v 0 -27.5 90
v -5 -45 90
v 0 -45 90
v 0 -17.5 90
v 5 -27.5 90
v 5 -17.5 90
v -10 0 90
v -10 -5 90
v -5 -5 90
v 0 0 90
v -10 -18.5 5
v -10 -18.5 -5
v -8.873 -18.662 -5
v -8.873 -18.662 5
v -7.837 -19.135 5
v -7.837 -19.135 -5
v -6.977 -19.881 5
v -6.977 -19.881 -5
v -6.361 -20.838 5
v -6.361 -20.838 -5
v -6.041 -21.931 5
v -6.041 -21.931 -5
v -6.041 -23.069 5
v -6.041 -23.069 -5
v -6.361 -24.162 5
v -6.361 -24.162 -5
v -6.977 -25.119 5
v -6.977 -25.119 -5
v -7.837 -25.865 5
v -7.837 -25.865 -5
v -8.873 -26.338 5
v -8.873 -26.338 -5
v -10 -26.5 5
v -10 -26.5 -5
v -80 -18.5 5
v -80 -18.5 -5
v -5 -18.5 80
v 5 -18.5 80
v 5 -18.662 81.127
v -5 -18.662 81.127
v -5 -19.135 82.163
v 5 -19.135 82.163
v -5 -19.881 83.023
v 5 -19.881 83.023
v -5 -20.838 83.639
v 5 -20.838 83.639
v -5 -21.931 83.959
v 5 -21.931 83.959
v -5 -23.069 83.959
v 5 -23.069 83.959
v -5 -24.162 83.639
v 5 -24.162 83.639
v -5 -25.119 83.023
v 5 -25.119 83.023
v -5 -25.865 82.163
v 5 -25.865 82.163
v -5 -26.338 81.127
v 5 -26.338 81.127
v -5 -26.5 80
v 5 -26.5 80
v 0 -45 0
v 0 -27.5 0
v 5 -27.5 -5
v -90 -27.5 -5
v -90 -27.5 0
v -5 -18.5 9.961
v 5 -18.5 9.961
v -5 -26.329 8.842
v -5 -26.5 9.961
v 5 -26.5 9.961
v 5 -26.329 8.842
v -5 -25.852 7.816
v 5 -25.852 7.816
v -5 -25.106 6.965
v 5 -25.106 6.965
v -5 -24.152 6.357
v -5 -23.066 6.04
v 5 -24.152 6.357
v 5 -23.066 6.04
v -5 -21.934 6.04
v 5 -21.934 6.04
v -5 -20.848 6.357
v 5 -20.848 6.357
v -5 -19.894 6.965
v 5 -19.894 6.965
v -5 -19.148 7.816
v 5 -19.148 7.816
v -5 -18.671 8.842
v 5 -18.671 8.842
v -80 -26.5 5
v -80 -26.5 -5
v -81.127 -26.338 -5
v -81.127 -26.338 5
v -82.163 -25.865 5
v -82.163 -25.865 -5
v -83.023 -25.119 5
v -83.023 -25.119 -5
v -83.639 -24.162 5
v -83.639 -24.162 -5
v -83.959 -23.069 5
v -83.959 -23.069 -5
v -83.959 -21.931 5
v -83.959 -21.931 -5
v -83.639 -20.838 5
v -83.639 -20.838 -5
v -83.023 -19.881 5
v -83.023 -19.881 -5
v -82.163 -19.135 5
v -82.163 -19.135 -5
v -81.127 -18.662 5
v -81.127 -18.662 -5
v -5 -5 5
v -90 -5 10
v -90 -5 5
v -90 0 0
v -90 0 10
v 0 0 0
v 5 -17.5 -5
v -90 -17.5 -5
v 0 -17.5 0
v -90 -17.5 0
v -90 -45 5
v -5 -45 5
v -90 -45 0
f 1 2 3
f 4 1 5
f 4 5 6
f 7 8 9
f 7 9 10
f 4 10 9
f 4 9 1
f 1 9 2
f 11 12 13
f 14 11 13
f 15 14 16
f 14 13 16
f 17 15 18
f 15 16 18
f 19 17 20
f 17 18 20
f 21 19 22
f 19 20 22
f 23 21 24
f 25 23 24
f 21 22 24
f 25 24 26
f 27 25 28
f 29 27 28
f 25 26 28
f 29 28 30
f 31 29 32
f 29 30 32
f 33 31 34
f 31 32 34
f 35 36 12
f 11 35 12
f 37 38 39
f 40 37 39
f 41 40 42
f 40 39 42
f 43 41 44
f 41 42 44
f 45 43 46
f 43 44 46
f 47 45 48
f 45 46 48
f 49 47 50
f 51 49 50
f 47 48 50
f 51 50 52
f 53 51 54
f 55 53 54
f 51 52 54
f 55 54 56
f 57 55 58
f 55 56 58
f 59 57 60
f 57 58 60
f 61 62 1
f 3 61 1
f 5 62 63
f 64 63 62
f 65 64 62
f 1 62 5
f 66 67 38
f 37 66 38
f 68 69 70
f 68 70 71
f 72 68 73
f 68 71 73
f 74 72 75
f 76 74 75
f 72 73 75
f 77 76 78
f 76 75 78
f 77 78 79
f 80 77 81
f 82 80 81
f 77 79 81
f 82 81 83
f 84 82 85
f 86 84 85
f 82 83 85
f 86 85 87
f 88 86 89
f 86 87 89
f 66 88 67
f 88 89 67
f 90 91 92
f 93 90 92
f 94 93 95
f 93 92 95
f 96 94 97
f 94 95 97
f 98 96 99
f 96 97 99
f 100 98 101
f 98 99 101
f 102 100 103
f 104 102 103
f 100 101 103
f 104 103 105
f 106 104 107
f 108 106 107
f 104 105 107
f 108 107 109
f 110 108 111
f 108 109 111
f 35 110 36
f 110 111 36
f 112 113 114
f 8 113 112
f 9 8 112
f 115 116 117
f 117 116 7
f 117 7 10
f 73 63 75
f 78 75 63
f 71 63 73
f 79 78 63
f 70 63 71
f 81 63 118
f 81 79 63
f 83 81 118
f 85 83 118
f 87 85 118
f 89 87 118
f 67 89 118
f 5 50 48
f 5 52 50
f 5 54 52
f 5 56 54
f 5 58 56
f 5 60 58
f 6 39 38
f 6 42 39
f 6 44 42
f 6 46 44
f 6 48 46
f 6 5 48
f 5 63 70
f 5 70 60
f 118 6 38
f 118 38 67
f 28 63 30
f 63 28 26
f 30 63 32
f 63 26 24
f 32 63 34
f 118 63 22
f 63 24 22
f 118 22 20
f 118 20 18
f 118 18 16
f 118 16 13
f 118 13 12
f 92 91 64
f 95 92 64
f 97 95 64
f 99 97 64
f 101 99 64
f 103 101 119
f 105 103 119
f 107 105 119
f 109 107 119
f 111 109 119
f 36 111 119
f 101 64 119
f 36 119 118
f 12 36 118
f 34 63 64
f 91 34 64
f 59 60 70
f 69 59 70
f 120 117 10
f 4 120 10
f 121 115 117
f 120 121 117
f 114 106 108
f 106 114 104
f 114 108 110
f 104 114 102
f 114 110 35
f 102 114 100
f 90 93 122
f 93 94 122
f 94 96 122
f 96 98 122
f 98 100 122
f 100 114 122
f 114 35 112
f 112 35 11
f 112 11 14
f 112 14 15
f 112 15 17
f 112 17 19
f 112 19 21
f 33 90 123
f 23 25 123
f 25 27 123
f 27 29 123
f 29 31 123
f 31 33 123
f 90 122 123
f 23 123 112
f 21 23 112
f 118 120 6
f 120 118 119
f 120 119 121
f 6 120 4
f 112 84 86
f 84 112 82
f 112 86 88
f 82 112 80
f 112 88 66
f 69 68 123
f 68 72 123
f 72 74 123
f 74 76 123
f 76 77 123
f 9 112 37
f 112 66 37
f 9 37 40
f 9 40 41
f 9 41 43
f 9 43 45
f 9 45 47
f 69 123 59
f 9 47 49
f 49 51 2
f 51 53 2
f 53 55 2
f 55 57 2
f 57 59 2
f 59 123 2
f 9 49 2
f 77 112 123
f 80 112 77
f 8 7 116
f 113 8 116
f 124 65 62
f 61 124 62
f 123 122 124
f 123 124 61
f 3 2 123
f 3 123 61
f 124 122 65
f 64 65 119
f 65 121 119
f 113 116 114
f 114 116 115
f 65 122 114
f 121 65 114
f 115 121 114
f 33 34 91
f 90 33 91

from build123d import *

# Parameters (mm, degrees)
F1_DEPTH  = 45
F3_DEPTH  = 40
F4_W      = 90
F4_H      = 10
F5_DEPTH  = 5
F6_W      = 10
F6_H      = 95
F7_DEPTH  = 5
F9_DEPTH  = 10
F11_DEPTH = 10


with BuildPart() as f1:
    # F0 (on Front) → F1 (new body)
    with BuildSketch(Plane.XZ):
        Polygon((-90, 10), (-90, 0), (0, 0), (0, 90), (-10, 90), align=None)
    extrude(amount=F1_DEPTH)

    # F2 (on face) → F3 (cut)
    with BuildSketch(Plane.XZ.offset(45)):
        Polygon((-10, 90), (-90, 10), (-90, 5), (-5, 5), (-5, 90), align=None)
    extrude(amount=-F3_DEPTH, mode=Mode.SUBTRACT)

    # F4 (on face) → F5 (join)
    with BuildSketch(Plane(origin=(0, 0, 0), x_dir=(1, 0, 0), z_dir=(0, 0, -1))):
        with Locations((-45, 22.5)):
            Rectangle(F4_W, F4_H)
    extrude(amount=F5_DEPTH)

    # F6 (on face) → F7 (join)
    with BuildSketch(Plane.YZ):
        with Locations((-22.5, 42.5)):
            Rectangle(F6_W, F6_H)
    extrude(amount=F7_DEPTH)

    # F8 (on face) → F9 (cut, through all)
    with BuildSketch(Plane.YZ.offset(5)):
        with BuildLine():
            ThreePointArc((-18.5, 80), (-22.5, 84), (-26.5, 80))
            Line((-26.5, 80), (-26.5, 9.960906))
            ThreePointArc((-26.5, 9.960906), (-22.5, 5.999809), (-18.5, 9.960906))
            Line((-18.5, 9.960906), (-18.5, 80))
        make_face()
    extrude(amount=-F9_DEPTH, mode=Mode.SUBTRACT)

    # F10 (on face) → F11 (cut, through all)
    with BuildSketch(Plane(origin=(0, 0, -5), x_dir=(1, 0, 0), z_dir=(0, 0, -1))):
        with BuildLine():
            ThreePointArc((-80, 26.5), (-84, 22.5), (-80, 18.5))
            Line((-80, 18.5), (-10, 18.5))
            ThreePointArc((-10, 18.5), (-6, 22.5), (-10, 26.5))
            Line((-10, 26.5), (-80, 26.5))
        make_face()
    extrude(amount=-F11_DEPTH, mode=Mode.SUBTRACT)


solid = f1.part
